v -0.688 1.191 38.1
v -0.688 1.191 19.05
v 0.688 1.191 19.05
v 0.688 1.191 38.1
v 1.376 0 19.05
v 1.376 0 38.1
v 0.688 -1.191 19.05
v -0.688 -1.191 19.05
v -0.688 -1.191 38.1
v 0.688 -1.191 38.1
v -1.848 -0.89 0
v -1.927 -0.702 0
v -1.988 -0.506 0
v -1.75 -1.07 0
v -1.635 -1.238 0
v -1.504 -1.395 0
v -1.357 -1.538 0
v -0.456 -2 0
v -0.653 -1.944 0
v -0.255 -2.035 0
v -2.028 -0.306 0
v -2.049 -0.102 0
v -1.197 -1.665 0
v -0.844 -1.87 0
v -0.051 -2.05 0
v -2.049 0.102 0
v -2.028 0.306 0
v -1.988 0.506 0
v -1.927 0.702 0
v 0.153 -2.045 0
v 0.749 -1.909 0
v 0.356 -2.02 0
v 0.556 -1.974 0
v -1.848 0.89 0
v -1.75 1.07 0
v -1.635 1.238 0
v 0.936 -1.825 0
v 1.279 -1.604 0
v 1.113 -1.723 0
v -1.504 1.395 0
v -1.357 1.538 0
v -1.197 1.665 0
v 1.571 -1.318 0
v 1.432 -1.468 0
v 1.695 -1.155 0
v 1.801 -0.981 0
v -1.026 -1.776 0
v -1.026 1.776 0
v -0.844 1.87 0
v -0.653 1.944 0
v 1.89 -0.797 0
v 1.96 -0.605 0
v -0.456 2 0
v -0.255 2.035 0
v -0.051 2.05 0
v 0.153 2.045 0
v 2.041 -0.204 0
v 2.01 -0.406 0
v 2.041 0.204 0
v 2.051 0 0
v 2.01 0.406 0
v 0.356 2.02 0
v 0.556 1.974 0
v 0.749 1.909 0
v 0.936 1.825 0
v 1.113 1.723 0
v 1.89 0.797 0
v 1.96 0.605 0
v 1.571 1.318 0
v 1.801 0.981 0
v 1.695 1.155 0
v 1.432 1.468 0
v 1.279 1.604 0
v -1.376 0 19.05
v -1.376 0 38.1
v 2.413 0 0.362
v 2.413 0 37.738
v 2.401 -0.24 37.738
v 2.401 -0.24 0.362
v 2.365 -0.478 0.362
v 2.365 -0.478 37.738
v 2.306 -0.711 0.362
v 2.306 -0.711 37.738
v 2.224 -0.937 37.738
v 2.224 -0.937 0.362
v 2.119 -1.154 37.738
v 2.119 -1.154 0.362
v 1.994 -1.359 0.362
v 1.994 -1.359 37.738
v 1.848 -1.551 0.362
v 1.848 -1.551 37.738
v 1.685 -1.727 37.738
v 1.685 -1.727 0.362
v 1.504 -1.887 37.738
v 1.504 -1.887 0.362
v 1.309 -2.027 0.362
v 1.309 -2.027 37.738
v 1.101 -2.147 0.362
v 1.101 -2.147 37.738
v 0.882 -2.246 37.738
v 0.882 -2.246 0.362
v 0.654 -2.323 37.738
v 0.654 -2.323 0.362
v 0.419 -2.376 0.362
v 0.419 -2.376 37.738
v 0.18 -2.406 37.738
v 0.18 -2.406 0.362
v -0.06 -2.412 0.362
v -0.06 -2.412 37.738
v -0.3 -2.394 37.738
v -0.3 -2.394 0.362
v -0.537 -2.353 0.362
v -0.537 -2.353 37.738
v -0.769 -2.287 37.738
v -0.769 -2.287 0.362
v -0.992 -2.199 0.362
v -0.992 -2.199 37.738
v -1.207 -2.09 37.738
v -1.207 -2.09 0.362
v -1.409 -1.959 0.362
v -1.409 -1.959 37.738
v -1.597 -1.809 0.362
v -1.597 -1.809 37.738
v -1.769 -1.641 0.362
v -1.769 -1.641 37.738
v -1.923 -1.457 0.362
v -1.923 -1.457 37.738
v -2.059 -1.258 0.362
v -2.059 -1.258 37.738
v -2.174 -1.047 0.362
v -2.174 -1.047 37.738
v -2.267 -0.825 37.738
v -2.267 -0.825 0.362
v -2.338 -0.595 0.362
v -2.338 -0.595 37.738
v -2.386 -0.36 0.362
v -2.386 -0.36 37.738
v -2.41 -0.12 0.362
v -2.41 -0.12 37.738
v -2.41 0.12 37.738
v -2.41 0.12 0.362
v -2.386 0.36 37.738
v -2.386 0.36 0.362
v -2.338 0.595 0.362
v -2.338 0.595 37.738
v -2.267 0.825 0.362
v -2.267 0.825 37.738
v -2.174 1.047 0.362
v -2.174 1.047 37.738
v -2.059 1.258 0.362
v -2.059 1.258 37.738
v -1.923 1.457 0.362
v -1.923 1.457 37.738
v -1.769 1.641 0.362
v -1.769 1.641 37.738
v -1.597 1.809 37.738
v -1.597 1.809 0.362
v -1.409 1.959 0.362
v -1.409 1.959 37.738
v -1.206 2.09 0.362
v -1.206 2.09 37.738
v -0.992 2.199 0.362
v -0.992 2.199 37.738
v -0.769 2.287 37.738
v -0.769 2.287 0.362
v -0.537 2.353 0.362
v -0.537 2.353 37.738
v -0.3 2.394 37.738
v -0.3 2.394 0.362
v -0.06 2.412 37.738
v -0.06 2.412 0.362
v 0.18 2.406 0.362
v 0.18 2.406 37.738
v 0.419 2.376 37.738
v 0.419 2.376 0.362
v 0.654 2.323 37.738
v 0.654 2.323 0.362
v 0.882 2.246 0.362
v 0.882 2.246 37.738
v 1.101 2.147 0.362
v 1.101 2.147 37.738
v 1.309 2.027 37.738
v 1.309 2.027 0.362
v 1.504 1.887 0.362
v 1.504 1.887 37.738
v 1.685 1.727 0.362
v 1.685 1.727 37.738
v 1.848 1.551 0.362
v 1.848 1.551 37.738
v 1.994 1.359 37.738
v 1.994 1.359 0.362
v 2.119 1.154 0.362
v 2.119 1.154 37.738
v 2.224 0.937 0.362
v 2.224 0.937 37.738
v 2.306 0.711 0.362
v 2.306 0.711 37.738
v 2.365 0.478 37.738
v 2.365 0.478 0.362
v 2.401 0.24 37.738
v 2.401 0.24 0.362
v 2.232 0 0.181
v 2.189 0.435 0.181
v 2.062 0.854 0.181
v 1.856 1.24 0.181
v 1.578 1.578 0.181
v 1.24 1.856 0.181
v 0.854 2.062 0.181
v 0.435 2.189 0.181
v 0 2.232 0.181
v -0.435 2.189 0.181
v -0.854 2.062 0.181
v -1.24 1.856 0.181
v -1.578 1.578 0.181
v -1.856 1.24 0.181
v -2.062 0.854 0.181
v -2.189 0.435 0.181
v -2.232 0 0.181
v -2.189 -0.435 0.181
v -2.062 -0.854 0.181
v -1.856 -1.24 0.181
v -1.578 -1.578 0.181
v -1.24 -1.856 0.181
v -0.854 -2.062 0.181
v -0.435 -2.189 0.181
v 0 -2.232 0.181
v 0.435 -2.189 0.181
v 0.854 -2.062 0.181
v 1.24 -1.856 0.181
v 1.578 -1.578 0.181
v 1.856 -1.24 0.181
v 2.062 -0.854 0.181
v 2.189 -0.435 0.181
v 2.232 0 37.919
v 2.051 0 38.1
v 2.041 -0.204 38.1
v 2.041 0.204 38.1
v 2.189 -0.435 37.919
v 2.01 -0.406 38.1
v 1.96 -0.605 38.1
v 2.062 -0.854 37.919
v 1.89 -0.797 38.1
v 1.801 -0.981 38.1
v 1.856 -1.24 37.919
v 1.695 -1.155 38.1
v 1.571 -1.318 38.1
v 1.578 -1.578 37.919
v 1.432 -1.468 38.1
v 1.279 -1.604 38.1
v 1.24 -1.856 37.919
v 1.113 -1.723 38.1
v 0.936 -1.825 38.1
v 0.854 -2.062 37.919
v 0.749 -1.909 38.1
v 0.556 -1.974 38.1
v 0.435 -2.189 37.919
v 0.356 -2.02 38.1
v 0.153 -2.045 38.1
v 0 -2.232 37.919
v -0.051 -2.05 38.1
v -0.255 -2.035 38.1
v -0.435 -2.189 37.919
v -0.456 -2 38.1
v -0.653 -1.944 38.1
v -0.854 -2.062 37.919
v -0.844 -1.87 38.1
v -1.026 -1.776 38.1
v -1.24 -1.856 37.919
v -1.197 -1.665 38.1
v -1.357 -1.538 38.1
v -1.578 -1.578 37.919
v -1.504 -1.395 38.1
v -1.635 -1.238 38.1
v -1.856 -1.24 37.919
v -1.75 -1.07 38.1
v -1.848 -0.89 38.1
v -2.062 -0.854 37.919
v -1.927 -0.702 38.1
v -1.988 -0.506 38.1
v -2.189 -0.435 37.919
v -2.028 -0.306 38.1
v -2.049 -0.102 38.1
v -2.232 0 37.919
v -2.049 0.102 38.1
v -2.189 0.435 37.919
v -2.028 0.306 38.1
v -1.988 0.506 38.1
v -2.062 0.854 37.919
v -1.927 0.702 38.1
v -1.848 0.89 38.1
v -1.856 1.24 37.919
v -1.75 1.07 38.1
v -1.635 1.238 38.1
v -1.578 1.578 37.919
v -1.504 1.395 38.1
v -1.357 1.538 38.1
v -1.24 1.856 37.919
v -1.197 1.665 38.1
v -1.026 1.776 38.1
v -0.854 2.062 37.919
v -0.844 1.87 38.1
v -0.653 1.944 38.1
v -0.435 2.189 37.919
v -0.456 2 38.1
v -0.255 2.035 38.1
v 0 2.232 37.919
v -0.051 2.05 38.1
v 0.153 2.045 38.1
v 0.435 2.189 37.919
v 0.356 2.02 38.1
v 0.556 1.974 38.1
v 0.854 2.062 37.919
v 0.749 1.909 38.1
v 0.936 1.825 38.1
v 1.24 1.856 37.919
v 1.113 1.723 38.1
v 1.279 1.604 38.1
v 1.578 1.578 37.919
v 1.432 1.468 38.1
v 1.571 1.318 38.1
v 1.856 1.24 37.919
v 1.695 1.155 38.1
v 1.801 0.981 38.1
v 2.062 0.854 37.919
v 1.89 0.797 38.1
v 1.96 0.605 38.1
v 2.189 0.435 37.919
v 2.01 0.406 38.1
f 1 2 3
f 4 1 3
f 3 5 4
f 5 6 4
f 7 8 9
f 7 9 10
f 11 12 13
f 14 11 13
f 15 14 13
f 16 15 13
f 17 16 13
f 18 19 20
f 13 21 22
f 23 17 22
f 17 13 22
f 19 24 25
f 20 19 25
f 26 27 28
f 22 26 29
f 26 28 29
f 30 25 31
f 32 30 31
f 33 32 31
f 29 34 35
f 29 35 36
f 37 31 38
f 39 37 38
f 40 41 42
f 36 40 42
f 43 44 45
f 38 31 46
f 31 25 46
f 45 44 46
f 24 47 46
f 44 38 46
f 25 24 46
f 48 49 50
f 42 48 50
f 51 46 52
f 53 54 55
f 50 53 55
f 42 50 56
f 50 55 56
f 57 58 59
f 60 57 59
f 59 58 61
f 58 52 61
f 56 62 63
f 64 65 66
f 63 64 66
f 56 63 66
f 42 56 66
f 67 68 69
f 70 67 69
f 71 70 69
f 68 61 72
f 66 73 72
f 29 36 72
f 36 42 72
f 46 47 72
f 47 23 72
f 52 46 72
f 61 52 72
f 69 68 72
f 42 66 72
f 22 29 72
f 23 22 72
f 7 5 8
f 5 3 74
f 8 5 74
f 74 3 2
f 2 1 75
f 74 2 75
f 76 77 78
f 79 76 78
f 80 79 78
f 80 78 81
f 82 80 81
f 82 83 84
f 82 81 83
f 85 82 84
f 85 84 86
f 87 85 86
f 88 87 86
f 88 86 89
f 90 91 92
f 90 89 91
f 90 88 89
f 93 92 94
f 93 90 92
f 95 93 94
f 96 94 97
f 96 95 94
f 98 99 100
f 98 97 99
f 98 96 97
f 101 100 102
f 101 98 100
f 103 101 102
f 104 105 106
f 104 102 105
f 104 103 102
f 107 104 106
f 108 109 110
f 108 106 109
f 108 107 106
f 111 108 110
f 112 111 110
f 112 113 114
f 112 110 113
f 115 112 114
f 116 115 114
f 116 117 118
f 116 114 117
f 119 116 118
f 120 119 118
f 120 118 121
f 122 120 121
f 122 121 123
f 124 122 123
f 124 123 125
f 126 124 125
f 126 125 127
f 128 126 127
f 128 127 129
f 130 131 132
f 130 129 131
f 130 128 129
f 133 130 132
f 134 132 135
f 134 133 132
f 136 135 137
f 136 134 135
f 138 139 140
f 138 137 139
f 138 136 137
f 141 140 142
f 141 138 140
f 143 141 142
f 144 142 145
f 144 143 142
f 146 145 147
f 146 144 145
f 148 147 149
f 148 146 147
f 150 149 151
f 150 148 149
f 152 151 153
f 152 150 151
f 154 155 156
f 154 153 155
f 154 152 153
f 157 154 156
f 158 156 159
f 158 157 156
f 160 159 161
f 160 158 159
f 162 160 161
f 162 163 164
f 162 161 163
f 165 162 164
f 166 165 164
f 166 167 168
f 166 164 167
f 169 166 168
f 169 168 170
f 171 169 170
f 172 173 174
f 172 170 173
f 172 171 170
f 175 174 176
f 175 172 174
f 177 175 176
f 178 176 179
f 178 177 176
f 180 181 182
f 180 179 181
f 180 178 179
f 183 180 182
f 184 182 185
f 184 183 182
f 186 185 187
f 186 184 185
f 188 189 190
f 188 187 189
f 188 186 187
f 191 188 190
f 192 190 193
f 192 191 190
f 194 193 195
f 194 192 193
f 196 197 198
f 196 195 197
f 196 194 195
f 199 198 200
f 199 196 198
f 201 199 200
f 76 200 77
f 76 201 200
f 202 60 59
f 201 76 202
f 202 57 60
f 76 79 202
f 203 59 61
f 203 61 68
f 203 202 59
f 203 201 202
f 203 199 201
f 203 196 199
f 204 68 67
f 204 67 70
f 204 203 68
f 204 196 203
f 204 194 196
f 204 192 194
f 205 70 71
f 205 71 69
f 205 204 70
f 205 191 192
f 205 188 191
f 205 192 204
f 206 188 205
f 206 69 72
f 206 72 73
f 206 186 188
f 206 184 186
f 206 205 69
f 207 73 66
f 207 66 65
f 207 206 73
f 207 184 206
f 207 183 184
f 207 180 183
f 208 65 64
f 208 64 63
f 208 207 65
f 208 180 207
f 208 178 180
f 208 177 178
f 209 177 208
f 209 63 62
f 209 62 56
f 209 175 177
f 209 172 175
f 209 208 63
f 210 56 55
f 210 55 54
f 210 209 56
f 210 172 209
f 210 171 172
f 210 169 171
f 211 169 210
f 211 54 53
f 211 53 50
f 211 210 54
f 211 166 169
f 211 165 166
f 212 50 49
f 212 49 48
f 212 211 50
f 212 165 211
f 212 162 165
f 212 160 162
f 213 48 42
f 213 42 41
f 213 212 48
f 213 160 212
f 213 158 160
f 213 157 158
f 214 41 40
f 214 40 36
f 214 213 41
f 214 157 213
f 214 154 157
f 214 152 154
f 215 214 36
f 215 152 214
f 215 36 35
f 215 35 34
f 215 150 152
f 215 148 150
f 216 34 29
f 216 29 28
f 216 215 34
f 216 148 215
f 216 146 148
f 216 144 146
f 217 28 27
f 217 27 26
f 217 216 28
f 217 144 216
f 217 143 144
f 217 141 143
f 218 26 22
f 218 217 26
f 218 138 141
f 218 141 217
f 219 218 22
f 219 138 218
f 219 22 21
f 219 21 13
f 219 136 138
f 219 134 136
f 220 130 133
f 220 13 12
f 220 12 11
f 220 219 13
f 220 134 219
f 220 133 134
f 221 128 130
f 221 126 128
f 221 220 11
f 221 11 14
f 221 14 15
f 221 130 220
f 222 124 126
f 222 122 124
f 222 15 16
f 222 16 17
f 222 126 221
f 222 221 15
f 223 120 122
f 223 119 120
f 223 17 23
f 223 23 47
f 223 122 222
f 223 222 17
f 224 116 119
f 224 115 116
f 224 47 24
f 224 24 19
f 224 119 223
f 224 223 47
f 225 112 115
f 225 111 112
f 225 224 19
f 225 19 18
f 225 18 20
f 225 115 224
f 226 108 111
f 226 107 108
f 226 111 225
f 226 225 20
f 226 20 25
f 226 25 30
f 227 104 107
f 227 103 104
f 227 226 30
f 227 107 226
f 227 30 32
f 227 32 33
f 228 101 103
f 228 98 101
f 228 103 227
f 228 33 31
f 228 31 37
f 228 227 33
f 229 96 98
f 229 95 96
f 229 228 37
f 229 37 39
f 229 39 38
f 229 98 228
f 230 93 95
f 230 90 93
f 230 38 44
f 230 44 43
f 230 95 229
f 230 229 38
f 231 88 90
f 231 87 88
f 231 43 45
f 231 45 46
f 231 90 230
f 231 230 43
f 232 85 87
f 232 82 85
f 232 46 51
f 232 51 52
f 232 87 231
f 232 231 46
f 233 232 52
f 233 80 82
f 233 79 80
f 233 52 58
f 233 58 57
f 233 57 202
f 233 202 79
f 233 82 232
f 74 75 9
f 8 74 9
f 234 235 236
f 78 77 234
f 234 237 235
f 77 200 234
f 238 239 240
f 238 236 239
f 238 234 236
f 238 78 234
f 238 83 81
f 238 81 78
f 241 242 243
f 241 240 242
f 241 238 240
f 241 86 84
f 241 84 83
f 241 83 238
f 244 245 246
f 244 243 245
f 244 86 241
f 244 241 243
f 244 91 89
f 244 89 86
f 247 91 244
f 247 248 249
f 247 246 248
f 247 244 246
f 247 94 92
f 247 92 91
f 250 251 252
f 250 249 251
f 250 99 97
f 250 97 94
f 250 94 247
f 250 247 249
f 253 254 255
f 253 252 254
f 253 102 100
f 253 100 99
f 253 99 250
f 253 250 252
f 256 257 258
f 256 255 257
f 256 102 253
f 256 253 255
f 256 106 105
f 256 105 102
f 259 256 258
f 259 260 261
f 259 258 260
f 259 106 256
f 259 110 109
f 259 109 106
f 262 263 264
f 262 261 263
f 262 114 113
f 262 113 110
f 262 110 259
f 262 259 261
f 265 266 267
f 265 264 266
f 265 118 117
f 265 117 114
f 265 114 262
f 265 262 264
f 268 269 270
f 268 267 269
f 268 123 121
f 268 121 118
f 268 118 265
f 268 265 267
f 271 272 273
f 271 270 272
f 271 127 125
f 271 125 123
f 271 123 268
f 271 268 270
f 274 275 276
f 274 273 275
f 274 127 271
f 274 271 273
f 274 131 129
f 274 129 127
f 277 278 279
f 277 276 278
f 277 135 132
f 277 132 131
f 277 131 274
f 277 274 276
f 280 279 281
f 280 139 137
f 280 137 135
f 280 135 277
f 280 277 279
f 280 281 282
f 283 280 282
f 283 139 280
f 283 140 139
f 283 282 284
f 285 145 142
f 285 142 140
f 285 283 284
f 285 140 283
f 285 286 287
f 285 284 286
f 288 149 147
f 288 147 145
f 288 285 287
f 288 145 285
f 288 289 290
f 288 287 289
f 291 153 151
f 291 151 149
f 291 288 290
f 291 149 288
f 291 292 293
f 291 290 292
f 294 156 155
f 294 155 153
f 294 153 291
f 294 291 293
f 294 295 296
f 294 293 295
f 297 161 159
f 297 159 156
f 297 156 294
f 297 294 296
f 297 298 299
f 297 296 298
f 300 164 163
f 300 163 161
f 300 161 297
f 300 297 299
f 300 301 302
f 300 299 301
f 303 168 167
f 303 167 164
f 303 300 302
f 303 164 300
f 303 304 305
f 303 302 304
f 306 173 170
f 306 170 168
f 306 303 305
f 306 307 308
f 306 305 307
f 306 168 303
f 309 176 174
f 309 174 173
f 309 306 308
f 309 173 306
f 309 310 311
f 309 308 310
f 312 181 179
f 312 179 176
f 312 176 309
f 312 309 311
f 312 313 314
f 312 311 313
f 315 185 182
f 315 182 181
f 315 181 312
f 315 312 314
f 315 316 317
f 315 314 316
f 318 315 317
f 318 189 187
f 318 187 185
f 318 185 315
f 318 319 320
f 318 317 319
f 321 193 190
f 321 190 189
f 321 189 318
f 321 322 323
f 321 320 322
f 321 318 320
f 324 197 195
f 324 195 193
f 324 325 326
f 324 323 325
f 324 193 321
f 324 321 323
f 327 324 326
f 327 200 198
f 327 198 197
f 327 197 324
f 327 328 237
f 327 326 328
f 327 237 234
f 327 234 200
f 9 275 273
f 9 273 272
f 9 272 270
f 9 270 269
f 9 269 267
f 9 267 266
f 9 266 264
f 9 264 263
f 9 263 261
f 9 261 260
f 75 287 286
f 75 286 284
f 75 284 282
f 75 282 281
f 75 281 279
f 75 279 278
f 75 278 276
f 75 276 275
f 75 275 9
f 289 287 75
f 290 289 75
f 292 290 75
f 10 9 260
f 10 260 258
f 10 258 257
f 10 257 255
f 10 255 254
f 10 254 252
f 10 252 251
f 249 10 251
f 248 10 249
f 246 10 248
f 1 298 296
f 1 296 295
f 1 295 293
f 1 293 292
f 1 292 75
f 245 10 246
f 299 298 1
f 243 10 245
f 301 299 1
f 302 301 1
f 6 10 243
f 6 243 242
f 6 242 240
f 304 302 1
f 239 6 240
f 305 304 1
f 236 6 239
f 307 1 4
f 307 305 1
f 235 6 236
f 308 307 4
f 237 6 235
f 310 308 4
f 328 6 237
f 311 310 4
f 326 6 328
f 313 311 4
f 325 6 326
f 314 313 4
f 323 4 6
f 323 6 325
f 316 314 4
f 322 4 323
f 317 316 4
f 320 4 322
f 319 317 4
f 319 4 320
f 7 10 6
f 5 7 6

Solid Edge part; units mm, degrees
sketch "Sketch1" plane through (0, 0, 0) normal (0, 0, 1) x (1, 0, 0)
  circle A0 centre (0, 0) radius 2.413
  dimension "D1" = 4.826
extrude "Protrusion1" add sketch "Sketch1" along normal blind 38.1
chamfer "Chamfer1" distance 0.3619 angle 45 2 edges at (-2.413, 0, 0) (-2.413, 0, 38.1)
sketch "Sketch2" plane through (0, 0, 38.1) normal (0, 0, 1) x (1, 0, 0)
  line L0 (-0.6878, 1.1913) -> (0.6878, 1.1913)
  line L1 (1.3755, 0) -> (0.6878, 1.1913)
  line L2 (0.6878, -1.1913) -> (1.3755, 0)
  line L3 (-0.6878, -1.1913) -> (0.6878, -1.1913)
  line L4 (-1.3755, 0) -> (-0.6878, -1.1913)
  line L5 (-0.6878, 1.1913) -> (-1.3755, 0)
  dimension "D1" = 2.3825
extrude "Cutout1" cut sketch "Sketch2" against normal blind 19.05
properties part number "24101312"
